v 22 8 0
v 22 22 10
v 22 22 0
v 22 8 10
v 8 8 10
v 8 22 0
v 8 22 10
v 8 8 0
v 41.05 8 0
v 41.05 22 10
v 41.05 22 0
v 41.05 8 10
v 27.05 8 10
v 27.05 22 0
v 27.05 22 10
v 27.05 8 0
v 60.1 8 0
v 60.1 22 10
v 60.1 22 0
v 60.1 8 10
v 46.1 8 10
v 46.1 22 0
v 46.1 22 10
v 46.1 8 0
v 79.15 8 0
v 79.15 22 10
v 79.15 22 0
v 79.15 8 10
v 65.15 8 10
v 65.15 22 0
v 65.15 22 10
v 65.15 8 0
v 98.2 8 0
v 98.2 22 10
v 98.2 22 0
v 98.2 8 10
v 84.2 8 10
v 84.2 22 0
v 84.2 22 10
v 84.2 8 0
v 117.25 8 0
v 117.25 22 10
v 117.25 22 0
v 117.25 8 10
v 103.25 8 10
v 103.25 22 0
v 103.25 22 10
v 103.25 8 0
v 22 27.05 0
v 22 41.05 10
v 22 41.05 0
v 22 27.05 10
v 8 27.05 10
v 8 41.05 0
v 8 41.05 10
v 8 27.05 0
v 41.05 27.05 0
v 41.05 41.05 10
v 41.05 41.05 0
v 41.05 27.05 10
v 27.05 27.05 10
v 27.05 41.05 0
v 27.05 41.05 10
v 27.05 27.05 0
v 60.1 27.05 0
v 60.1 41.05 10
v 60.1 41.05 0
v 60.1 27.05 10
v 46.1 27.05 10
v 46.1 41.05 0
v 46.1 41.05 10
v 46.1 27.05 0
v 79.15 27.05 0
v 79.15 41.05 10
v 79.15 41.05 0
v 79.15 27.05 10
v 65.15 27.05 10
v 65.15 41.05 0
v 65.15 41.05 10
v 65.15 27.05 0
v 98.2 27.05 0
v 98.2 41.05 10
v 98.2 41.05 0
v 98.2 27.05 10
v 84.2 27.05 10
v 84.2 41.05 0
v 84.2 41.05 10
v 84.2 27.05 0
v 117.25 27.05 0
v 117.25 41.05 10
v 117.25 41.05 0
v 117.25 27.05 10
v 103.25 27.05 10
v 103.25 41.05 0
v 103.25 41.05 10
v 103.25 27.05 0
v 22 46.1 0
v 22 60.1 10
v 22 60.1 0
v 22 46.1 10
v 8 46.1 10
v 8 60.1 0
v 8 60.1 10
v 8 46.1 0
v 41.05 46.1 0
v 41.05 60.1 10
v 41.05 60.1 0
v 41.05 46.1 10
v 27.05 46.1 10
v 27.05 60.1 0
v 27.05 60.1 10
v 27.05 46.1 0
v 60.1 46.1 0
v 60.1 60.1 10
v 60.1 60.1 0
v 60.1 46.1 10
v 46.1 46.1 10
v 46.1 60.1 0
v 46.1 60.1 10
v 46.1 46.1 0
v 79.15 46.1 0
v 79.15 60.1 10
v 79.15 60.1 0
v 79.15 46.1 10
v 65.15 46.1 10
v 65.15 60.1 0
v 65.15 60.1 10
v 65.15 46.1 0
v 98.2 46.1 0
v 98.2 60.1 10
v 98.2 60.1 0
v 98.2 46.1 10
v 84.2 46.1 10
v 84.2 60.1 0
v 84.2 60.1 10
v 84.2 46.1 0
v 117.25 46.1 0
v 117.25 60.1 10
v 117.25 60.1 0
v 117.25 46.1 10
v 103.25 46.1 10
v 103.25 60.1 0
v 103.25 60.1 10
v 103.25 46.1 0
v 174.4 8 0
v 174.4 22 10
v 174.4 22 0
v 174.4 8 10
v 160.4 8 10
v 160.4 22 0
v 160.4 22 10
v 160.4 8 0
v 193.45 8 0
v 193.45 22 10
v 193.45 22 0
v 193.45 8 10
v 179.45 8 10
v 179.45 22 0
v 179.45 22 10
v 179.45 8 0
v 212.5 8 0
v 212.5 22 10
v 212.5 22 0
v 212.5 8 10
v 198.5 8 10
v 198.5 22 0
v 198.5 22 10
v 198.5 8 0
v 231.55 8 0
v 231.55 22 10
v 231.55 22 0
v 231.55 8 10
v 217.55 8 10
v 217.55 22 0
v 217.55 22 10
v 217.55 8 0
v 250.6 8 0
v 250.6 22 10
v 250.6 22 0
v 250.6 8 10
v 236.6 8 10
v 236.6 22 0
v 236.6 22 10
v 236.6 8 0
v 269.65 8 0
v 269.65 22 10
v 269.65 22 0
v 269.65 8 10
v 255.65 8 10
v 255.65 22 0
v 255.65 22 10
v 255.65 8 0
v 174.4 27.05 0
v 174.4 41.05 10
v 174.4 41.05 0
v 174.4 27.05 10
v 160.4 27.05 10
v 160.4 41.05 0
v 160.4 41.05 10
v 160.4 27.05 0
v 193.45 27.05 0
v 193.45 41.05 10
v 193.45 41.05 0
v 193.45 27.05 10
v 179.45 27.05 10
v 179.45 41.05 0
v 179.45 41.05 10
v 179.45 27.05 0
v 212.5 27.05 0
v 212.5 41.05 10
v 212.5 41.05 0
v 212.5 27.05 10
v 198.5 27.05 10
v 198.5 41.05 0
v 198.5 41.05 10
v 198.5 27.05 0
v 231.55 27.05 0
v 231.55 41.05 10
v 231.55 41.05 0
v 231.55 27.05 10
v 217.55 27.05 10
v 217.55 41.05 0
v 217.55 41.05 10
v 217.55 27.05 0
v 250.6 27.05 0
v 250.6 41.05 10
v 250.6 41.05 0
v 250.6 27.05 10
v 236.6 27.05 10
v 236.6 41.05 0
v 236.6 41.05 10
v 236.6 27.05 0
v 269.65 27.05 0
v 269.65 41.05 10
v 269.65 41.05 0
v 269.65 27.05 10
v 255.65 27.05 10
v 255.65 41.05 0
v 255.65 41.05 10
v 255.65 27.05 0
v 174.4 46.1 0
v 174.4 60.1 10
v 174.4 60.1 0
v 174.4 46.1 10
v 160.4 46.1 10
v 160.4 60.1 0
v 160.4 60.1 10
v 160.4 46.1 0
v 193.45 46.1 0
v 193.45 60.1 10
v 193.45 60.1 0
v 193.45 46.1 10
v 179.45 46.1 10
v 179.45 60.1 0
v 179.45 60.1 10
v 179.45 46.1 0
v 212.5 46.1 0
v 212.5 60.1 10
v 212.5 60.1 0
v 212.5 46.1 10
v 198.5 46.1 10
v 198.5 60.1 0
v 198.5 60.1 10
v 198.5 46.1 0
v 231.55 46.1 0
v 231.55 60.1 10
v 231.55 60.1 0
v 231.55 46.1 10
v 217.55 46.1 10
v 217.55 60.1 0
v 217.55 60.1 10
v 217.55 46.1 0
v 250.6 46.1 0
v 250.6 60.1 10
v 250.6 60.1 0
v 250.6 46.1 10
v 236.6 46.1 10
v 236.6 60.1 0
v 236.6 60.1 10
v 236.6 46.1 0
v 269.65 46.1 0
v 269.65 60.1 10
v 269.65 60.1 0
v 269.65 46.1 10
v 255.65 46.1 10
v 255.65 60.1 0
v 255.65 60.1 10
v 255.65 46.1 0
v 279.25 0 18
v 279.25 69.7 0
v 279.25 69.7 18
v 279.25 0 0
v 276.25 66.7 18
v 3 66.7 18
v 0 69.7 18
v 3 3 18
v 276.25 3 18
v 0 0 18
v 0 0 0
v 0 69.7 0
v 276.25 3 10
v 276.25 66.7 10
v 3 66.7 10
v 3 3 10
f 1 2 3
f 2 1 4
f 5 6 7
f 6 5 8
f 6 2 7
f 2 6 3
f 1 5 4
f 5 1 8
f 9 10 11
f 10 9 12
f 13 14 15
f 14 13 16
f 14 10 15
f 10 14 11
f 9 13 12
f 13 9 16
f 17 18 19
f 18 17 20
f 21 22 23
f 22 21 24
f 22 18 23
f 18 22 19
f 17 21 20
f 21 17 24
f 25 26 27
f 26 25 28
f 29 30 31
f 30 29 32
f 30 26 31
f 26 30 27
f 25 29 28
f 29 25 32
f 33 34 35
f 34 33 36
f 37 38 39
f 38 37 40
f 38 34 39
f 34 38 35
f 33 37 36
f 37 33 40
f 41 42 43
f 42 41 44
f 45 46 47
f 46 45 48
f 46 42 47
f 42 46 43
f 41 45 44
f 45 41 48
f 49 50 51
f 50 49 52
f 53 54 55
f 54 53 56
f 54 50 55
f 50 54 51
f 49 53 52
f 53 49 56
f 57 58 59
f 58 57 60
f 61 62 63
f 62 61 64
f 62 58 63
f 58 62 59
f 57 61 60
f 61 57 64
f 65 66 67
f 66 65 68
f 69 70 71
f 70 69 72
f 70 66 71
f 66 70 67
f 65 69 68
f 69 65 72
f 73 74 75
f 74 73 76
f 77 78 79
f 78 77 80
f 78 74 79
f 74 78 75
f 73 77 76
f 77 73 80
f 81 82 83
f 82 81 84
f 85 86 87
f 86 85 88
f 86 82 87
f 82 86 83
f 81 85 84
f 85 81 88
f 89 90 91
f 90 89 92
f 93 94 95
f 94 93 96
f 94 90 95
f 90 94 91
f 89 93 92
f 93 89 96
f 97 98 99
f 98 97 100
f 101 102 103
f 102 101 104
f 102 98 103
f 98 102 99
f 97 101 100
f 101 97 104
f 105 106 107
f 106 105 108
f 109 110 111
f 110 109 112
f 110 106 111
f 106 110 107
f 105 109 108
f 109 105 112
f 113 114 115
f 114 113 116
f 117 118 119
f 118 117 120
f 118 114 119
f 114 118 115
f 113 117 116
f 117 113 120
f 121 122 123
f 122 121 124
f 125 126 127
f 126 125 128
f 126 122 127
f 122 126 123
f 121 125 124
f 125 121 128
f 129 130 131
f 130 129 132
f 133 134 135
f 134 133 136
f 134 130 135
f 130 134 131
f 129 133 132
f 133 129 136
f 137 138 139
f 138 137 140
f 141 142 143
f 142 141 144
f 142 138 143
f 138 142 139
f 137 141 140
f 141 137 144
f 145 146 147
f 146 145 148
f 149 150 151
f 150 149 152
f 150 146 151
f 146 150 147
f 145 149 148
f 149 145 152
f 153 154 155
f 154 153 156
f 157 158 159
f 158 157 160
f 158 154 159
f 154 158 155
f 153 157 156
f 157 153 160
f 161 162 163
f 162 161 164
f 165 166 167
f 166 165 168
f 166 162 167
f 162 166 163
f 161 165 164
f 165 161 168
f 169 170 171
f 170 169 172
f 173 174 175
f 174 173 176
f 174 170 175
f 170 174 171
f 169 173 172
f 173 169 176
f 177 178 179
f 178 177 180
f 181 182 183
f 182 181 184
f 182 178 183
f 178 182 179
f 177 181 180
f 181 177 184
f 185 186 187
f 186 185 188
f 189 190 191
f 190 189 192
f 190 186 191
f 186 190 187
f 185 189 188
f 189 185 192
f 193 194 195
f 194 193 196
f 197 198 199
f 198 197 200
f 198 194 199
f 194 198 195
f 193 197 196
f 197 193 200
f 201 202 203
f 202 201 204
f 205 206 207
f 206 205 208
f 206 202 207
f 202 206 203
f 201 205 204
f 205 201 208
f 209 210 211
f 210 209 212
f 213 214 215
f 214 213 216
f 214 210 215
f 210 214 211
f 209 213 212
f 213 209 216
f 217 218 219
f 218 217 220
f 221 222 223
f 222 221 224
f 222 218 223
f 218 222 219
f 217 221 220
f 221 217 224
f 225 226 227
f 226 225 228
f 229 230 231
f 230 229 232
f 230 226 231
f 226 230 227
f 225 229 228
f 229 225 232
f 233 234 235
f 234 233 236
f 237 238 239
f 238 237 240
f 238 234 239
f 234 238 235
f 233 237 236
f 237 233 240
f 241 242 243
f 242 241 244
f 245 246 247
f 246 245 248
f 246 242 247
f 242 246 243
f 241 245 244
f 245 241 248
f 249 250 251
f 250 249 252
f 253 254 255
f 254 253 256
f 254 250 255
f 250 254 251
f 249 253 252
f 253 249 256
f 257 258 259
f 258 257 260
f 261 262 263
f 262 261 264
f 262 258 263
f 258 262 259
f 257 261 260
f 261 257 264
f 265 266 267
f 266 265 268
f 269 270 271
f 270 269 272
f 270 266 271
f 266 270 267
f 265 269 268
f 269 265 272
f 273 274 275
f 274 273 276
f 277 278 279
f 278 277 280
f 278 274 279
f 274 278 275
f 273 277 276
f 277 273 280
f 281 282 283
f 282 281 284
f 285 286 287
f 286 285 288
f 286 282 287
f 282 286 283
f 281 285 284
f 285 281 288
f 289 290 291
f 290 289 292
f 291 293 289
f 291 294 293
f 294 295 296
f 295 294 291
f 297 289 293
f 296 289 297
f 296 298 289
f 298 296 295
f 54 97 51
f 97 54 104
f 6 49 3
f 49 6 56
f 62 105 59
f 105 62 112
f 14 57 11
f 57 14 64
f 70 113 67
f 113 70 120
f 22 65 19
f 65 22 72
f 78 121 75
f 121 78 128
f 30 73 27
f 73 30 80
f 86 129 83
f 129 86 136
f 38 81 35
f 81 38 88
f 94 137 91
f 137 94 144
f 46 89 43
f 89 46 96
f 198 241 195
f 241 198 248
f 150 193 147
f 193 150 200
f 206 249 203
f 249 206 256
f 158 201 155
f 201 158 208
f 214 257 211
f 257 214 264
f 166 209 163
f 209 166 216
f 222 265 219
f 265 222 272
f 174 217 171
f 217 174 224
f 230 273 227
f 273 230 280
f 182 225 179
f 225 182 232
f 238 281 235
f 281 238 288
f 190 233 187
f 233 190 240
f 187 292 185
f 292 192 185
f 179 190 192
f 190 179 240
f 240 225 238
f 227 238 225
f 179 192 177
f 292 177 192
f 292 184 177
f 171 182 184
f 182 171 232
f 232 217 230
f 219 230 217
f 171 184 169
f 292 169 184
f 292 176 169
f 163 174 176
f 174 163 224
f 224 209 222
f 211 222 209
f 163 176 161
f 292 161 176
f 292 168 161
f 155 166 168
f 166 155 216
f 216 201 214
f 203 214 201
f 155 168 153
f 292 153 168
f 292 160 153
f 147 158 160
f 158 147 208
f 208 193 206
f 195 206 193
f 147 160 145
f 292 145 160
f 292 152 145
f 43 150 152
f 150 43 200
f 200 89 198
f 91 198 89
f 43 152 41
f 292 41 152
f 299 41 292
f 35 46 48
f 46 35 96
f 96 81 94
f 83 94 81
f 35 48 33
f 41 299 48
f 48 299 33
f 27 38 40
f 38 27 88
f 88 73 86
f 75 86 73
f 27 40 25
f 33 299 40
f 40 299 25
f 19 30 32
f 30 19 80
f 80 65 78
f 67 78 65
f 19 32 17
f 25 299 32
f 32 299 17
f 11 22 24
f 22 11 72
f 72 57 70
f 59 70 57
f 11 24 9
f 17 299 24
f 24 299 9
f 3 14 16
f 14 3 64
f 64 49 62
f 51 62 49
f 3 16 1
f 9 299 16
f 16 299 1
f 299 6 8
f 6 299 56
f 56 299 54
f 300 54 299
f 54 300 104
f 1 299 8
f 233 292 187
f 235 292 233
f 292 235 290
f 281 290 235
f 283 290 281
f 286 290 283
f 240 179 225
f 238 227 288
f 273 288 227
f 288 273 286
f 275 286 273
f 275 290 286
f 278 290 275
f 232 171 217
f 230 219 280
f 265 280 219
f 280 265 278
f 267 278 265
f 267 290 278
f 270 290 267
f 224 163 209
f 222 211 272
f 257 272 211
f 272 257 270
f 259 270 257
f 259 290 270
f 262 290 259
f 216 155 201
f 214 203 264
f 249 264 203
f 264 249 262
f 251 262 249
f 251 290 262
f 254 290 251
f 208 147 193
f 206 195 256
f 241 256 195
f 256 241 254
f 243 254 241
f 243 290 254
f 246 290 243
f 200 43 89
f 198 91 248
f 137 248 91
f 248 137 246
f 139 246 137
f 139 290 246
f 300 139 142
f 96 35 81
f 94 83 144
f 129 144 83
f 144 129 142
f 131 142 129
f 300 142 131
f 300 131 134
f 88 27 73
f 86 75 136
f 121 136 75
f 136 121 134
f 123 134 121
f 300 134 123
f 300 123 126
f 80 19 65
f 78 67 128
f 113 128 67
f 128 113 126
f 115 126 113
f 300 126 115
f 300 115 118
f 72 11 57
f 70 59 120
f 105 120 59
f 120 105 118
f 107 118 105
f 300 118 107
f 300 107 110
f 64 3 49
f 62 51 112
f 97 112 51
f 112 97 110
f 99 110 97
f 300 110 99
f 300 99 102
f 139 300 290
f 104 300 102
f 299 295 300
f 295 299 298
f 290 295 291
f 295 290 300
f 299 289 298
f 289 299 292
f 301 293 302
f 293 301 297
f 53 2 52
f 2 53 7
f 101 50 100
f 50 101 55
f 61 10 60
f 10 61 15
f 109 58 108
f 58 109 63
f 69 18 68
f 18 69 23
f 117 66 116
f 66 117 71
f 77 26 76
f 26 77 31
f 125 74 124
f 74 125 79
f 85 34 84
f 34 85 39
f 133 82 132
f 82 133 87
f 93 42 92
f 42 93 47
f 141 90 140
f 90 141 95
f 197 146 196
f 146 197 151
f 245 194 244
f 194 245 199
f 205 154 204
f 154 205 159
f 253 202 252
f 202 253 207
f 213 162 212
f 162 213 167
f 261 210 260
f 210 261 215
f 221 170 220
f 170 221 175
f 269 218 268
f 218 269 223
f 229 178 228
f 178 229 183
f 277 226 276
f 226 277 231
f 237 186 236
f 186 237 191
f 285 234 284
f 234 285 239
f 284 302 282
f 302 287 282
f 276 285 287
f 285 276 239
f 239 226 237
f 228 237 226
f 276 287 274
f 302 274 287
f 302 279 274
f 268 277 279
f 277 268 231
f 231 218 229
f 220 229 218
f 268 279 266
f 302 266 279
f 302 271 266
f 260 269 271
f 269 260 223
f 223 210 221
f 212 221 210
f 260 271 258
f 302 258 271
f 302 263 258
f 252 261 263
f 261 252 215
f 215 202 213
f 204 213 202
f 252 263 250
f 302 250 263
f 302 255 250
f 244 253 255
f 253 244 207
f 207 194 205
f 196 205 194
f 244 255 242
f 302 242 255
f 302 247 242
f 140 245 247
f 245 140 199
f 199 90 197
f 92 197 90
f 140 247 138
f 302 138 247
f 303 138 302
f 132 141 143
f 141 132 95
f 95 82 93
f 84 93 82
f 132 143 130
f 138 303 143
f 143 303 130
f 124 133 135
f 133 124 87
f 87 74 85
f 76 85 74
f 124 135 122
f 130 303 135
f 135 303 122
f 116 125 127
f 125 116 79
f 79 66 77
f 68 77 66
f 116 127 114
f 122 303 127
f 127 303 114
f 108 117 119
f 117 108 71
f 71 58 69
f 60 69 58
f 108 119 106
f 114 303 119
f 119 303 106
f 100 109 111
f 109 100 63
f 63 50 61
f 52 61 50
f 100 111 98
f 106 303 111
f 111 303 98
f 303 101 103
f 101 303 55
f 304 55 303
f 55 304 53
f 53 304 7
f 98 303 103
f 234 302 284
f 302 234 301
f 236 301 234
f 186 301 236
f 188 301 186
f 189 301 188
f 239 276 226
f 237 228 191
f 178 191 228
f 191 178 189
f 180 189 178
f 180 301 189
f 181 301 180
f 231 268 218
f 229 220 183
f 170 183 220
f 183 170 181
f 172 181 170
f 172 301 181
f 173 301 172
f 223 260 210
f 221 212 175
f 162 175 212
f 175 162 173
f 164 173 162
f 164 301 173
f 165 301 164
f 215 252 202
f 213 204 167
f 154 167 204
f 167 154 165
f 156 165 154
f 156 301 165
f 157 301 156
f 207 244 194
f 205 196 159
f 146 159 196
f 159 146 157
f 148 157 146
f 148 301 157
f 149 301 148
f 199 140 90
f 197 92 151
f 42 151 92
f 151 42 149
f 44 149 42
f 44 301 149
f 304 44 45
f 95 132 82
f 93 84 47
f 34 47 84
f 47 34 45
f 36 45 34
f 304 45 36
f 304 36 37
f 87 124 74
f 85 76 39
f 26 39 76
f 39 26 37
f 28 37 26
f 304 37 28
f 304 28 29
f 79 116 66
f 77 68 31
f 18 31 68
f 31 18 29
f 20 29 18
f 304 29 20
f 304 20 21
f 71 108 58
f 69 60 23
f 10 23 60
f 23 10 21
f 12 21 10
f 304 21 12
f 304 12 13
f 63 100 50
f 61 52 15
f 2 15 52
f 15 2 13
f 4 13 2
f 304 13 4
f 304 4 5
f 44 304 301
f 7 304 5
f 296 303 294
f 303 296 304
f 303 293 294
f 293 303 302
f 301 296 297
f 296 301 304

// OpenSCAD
// Generated keyboard case
// Layout: Custom (36 keys)
// Switch type: Cherry MX
// Split keyboard: unified case

// Parameters
case_width = 279.25;
case_height = 69.70;
case_depth = 18.00;
wall_thickness = 3.00;
base_height = 10.00;
switch_cutout_size = 14.00;
key_spacing = 19.05;

module keyboard_case() {
    difference() {
        // Outer shell
        translate([0, 0, 0])
            cube([case_width, case_height, case_depth]);

        // Inner cavity
        translate([wall_thickness, wall_thickness, base_height])
            cube([case_width - 2*wall_thickness, 
                  case_height - 2*wall_thickness, 
                  case_depth - base_height + 1]);

        // Switch cutouts
        translate([wall_thickness + 5 - 0.00, wall_thickness + 5 - 0.00, -1])
            switch_plate();
    }
}

module switch_plate() {
    translate([0.00, 0.00, 0])
        cube([switch_cutout_size, switch_cutout_size, base_height + 2]);
    translate([19.05, 0.00, 0])
        cube([switch_cutout_size, switch_cutout_size, base_height + 2]);
    translate([38.10, 0.00, 0])
        cube([switch_cutout_size, switch_cutout_size, base_height + 2]);
    translate([57.15, 0.00, 0])
        cube([switch_cutout_size, switch_cutout_size, base_height + 2]);
    translate([76.20, 0.00, 0])
        cube([switch_cutout_size, switch_cutout_size, base_height + 2]);
    translate([95.25, 0.00, 0])
        cube([switch_cutout_size, switch_cutout_size, base_height + 2]);
    translate([0.00, 19.05, 0])
        cube([switch_cutout_size, switch_cutout_size, base_height + 2]);
    translate([19.05, 19.05, 0])
        cube([switch_cutout_size, switch_cutout_size, base_height + 2]);
    translate([38.10, 19.05, 0])
        cube([switch_cutout_size, switch_cutout_size, base_height + 2]);
    translate([57.15, 19.05, 0])
        cube([switch_cutout_size, switch_cutout_size, base_height + 2]);
    translate([76.20, 19.05, 0])
        cube([switch_cutout_size, switch_cutout_size, base_height + 2]);
    translate([95.25, 19.05, 0])
        cube([switch_cutout_size, switch_cutout_size, base_height + 2]);
    translate([0.00, 38.10, 0])
        cube([switch_cutout_size, switch_cutout_size, base_height + 2]);
    translate([19.05, 38.10, 0])
        cube([switch_cutout_size, switch_cutout_size, base_height + 2]);
    translate([38.10, 38.10, 0])
        cube([switch_cutout_size, switch_cutout_size, base_height + 2]);
    translate([57.15, 38.10, 0])
        cube([switch_cutout_size, switch_cutout_size, base_height + 2]);
    translate([76.20, 38.10, 0])
        cube([switch_cutout_size, switch_cutout_size, base_height + 2]);
    translate([95.25, 38.10, 0])
        cube([switch_cutout_size, switch_cutout_size, base_height + 2]);
    translate([152.40, 0.00, 0])
        cube([switch_cutout_size, switch_cutout_size, base_height + 2]);
    translate([171.45, 0.00, 0])
        cube([switch_cutout_size, switch_cutout_size, base_height + 2]);
    translate([190.50, 0.00, 0])
        cube([switch_cutout_size, switch_cutout_size, base_height + 2]);
    translate([209.55, 0.00, 0])
        cube([switch_cutout_size, switch_cutout_size, base_height + 2]);
    translate([228.60, 0.00, 0])
        cube([switch_cutout_size, switch_cutout_size, base_height + 2]);
    translate([247.65, 0.00, 0])
        cube([switch_cutout_size, switch_cutout_size, base_height + 2]);
    translate([152.40, 19.05, 0])
        cube([switch_cutout_size, switch_cutout_size, base_height + 2]);
    translate([171.45, 19.05, 0])
        cube([switch_cutout_size, switch_cutout_size, base_height + 2]);
    translate([190.50, 19.05, 0])
        cube([switch_cutout_size, switch_cutout_size, base_height + 2]);
    translate([209.55, 19.05, 0])
        cube([switch_cutout_size, switch_cutout_size, base_height + 2]);
    translate([228.60, 19.05, 0])
        cube([switch_cutout_size, switch_cutout_size, base_height + 2]);
    translate([247.65, 19.05, 0])
        cube([switch_cutout_size, switch_cutout_size, base_height + 2]);
    translate([152.40, 38.10, 0])
        cube([switch_cutout_size, switch_cutout_size, base_height + 2]);
    translate([171.45, 38.10, 0])
        cube([switch_cutout_size, switch_cutout_size, base_height + 2]);
    translate([190.50, 38.10, 0])
        cube([switch_cutout_size, switch_cutout_size, base_height + 2]);
    translate([209.55, 38.10, 0])
        cube([switch_cutout_size, switch_cutout_size, base_height + 2]);
    translate([228.60, 38.10, 0])
        cube([switch_cutout_size, switch_cutout_size, base_height + 2]);
    translate([247.65, 38.10, 0])
        cube([switch_cutout_size, switch_cutout_size, base_height + 2]);
}

// Generate the case
keyboard_case();
